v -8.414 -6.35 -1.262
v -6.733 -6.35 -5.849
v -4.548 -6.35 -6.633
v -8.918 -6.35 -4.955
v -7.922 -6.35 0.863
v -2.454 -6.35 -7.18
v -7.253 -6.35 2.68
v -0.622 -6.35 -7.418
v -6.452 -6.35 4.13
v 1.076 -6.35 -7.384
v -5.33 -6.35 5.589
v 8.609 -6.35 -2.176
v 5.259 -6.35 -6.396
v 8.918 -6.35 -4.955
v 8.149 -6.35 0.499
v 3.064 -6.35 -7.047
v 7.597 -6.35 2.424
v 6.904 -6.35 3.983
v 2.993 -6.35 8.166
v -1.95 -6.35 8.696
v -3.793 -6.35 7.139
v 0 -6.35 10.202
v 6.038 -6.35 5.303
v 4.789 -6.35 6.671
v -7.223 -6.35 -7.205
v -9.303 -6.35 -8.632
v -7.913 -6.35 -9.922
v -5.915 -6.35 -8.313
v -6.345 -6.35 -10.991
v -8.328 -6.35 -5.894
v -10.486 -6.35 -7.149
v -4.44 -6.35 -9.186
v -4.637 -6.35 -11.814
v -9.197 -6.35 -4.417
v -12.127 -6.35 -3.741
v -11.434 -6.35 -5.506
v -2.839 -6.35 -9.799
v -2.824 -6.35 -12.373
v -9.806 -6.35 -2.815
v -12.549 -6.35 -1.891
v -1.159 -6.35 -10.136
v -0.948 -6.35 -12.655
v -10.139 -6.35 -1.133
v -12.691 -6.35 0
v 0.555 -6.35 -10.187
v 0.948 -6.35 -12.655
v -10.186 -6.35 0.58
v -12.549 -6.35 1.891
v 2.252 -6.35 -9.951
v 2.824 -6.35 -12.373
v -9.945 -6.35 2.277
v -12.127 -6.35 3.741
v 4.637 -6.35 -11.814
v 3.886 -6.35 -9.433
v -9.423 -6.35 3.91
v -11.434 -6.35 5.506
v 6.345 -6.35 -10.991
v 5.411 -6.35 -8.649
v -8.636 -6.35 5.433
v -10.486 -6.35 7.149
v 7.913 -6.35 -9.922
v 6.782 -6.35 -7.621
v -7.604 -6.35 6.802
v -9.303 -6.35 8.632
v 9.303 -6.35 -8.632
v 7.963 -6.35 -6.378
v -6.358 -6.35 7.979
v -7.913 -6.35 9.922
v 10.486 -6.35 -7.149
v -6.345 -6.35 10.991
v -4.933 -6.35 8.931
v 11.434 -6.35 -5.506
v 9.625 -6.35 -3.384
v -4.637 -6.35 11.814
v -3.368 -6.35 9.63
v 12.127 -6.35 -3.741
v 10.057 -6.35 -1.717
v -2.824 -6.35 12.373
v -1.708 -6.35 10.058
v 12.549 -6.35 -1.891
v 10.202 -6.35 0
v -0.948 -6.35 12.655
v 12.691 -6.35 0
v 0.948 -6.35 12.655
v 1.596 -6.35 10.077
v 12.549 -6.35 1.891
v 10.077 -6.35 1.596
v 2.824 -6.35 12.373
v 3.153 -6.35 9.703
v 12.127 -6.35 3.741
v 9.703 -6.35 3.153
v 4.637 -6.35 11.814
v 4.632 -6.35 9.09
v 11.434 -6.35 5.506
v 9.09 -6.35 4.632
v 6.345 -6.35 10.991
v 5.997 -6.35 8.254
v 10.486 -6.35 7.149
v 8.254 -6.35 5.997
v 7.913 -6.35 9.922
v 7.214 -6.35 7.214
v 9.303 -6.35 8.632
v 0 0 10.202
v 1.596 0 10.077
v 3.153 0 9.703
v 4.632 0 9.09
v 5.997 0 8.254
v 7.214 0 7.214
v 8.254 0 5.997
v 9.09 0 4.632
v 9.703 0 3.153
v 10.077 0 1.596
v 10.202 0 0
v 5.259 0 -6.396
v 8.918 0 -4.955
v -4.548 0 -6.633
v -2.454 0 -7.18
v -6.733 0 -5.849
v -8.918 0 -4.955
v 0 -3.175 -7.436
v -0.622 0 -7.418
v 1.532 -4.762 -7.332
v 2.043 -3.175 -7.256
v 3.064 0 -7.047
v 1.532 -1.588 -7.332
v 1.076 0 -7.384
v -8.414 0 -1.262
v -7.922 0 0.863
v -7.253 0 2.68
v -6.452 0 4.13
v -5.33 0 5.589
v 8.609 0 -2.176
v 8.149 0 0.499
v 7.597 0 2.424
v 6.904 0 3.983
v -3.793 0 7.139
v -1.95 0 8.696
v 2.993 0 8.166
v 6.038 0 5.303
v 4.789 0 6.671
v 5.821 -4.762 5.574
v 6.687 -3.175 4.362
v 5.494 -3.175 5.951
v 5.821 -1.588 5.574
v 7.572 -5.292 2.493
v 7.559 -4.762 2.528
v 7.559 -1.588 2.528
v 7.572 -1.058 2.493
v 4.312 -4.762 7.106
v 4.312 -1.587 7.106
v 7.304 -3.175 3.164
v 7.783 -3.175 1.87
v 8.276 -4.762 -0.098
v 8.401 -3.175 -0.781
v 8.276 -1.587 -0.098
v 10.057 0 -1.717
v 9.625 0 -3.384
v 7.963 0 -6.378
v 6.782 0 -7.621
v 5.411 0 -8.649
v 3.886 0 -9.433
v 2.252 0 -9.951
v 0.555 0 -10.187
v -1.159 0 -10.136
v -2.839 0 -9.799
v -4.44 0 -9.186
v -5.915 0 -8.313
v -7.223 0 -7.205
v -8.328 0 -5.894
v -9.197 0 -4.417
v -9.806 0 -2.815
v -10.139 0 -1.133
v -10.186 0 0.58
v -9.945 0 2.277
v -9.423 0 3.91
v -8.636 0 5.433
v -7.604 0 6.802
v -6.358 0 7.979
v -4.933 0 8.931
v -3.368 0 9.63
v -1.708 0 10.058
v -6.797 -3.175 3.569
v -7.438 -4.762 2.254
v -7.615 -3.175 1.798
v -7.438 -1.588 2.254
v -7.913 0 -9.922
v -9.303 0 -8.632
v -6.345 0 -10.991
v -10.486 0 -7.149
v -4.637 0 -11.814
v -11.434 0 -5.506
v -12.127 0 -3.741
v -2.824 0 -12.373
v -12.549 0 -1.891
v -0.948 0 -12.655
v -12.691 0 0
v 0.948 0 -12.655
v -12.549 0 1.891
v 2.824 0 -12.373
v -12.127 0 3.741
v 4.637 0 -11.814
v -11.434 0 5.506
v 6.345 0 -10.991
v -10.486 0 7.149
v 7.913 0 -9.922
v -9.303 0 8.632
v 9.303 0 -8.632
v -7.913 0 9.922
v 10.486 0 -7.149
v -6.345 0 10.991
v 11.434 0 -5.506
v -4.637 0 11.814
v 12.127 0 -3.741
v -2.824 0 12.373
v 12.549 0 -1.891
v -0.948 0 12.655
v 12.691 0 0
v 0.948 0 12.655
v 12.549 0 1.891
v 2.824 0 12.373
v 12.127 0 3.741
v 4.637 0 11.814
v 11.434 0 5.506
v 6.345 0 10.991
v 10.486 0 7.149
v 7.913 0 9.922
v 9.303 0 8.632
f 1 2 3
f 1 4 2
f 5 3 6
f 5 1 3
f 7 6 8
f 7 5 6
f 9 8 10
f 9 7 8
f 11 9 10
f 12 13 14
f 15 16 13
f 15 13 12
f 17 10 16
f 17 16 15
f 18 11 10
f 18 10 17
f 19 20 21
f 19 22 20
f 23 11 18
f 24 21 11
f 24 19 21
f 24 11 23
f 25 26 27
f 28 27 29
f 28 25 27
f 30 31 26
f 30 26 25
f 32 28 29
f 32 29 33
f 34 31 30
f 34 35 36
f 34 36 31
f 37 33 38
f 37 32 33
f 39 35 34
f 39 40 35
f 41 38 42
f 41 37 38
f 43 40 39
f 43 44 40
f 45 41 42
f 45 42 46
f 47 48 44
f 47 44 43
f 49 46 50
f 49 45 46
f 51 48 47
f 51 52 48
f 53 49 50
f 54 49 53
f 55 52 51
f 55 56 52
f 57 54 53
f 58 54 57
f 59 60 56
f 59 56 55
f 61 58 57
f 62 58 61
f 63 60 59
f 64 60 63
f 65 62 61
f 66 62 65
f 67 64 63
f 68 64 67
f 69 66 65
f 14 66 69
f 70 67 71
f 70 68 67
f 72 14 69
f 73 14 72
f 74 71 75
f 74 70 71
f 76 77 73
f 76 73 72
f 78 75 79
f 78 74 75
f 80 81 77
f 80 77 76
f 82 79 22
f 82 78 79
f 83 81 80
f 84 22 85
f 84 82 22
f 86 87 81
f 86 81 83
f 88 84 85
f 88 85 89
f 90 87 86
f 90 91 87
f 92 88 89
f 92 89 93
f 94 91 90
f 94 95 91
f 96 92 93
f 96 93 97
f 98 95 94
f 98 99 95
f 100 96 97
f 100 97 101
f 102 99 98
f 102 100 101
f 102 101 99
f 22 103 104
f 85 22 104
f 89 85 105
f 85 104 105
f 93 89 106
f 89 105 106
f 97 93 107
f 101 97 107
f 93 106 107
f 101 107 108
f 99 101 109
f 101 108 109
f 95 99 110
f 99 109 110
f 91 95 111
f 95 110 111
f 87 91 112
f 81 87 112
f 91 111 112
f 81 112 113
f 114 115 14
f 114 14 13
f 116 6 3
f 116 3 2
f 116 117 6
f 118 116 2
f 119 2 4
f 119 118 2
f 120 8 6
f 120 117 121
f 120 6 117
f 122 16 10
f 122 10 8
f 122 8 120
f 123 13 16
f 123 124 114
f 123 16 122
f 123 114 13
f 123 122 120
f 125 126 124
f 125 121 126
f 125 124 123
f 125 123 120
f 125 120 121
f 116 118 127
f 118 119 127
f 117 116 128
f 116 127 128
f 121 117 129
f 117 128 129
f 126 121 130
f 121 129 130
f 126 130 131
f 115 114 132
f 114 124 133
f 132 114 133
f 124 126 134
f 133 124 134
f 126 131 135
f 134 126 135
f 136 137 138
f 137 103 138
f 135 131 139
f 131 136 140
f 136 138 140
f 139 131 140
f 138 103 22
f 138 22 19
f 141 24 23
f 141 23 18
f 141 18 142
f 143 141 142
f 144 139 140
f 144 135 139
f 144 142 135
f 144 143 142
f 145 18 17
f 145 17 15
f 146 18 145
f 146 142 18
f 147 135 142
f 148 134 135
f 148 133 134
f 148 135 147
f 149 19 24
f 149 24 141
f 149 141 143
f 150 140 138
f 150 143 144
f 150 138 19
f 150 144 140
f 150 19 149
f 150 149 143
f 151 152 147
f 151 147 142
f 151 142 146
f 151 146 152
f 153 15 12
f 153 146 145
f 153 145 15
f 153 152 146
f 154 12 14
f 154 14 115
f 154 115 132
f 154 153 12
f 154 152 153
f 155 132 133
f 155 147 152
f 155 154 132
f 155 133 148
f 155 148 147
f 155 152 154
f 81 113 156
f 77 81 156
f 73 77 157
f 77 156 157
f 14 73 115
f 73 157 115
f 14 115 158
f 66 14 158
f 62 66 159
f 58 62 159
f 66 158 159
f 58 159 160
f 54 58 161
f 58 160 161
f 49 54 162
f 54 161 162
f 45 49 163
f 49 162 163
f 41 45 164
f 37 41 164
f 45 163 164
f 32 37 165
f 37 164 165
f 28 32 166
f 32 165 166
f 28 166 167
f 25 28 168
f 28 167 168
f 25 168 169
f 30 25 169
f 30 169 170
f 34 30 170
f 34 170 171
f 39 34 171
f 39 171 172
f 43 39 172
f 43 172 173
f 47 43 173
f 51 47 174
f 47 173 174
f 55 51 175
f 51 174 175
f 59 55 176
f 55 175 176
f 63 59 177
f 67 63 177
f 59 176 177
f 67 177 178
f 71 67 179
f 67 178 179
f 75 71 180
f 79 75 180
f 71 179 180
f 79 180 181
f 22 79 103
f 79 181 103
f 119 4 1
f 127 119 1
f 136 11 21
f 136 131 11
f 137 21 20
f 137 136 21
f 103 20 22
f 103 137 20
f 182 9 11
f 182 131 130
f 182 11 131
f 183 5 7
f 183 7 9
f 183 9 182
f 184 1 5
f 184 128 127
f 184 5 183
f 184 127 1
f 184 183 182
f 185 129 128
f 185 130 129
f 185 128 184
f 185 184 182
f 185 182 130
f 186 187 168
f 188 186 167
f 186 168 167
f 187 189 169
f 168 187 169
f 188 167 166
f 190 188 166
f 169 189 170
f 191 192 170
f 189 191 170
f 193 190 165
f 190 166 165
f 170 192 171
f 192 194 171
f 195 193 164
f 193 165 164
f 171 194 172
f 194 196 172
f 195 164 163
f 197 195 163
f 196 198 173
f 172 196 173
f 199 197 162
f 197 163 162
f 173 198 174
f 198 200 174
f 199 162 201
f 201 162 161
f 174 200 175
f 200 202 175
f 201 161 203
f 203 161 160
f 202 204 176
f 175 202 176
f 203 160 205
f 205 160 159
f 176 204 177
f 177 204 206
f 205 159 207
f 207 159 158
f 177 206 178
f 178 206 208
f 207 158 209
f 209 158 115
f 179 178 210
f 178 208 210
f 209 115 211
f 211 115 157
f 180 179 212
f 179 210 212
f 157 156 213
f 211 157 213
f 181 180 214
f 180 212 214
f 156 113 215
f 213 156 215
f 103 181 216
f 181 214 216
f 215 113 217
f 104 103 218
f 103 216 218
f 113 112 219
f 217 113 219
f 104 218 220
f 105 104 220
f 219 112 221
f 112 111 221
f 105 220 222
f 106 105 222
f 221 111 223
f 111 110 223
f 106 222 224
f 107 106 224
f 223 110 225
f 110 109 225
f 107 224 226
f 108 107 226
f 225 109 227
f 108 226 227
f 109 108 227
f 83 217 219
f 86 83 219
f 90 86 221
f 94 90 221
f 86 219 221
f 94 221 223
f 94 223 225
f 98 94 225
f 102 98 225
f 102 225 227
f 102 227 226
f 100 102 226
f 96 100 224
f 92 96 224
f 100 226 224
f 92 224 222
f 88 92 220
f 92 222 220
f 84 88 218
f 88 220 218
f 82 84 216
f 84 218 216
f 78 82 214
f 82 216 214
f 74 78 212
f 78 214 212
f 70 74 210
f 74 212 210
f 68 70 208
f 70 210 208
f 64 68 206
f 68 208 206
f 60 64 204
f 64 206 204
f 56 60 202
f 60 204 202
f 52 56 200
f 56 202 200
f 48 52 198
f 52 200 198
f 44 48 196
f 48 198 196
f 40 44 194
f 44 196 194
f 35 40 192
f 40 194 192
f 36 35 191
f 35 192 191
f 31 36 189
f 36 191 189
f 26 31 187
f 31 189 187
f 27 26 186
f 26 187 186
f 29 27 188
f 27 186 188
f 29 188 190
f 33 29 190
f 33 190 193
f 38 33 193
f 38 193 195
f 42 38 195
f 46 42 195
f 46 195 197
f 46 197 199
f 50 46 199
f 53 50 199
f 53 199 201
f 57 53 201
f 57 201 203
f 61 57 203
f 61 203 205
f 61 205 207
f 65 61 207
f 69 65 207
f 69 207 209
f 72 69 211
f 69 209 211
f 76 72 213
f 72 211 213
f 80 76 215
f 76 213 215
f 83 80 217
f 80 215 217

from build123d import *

# Parameters (mm, degrees)
F0_R     = 12.6909451001
F1_DEPTH = 6.35


with BuildPart() as f1:
    # F0 (on Front) → F1 (new body)
    with BuildSketch(Plane.XZ):
        Circle(F0_R)
        with BuildLine():
            ThreePointArc((0, 10.202302307), (7.214117145, 7.214117145), (10.202302307, 0))
            ThreePointArc((10.202302307, 0), (9.8760327191, -2.5594823884), (8.9180921554, -4.9552603031))
            ThreePointArc((8.9180921554, -4.9552603031), (0, -10.202302307), (-8.9180921554, -4.9552603031))
            ThreePointArc((-8.9180921554, -4.9552603031), (-8.79323706, 5.1735823537), (0, 10.202302307))
        make_face(mode=Mode.SUBTRACT)
    extrude(amount=F1_DEPTH)


with BuildPart() as f1b:
    # F0 (on Front) → F1, piece 2 (new body)
    with BuildSketch(Plane.XZ):
        Polygon((8.9180921554, -4.9552603031), (0, 10.202302307), (-8.9180921554, -4.9552603031), align=None)
        with BuildLine():
            add(Edge.make_bspline(
                [(0, 10.202302307), (2.6000968364, 8.5114801067), (7.9012546942, 5.0641795031), (8.5748698476, -1.5733085313), (8.9180921554, -4.9552603031)],
                knots=[0, 0, 0, 0, 0.4904771573, 1, 1, 1, 1], degree=3))
            Line((0, 10.202302307), (8.9180921554, -4.9552603031))
        make_face()
        with BuildLine():
            add(Edge.make_bspline(
                [(8.9180921554, -4.9552603031), (5.9453947703, -6.1955669598), (0, -8.6761802732), (-5.9453947703, -6.1955669598), (-8.9180921554, -4.9552603031)],
                knots=[0, 0, 0, 0, 0.5, 1, 1, 1, 1], degree=3))
            Line((8.9180921554, -4.9552603031), (-8.9180921554, -4.9552603031))
        make_face()
        with BuildLine():
            Line((-8.9180921554, -4.9552603031), (0, 10.202302307))
            add(Edge.make_bspline(
                [(-8.9180921554, -4.9552603031), (-8.5717202474, -1.9384966543), (-7.8652036534, 4.2149861439), (-2.6555865042, 8.1807607552), (0, 10.202302307)],
                knots=[0, 0, 0, 0, 0.4902530401, 1, 1, 1, 1], degree=3))
        make_face()
    extrude(amount=F1_DEPTH)


solid = Compound([f1.part, f1b.part])
